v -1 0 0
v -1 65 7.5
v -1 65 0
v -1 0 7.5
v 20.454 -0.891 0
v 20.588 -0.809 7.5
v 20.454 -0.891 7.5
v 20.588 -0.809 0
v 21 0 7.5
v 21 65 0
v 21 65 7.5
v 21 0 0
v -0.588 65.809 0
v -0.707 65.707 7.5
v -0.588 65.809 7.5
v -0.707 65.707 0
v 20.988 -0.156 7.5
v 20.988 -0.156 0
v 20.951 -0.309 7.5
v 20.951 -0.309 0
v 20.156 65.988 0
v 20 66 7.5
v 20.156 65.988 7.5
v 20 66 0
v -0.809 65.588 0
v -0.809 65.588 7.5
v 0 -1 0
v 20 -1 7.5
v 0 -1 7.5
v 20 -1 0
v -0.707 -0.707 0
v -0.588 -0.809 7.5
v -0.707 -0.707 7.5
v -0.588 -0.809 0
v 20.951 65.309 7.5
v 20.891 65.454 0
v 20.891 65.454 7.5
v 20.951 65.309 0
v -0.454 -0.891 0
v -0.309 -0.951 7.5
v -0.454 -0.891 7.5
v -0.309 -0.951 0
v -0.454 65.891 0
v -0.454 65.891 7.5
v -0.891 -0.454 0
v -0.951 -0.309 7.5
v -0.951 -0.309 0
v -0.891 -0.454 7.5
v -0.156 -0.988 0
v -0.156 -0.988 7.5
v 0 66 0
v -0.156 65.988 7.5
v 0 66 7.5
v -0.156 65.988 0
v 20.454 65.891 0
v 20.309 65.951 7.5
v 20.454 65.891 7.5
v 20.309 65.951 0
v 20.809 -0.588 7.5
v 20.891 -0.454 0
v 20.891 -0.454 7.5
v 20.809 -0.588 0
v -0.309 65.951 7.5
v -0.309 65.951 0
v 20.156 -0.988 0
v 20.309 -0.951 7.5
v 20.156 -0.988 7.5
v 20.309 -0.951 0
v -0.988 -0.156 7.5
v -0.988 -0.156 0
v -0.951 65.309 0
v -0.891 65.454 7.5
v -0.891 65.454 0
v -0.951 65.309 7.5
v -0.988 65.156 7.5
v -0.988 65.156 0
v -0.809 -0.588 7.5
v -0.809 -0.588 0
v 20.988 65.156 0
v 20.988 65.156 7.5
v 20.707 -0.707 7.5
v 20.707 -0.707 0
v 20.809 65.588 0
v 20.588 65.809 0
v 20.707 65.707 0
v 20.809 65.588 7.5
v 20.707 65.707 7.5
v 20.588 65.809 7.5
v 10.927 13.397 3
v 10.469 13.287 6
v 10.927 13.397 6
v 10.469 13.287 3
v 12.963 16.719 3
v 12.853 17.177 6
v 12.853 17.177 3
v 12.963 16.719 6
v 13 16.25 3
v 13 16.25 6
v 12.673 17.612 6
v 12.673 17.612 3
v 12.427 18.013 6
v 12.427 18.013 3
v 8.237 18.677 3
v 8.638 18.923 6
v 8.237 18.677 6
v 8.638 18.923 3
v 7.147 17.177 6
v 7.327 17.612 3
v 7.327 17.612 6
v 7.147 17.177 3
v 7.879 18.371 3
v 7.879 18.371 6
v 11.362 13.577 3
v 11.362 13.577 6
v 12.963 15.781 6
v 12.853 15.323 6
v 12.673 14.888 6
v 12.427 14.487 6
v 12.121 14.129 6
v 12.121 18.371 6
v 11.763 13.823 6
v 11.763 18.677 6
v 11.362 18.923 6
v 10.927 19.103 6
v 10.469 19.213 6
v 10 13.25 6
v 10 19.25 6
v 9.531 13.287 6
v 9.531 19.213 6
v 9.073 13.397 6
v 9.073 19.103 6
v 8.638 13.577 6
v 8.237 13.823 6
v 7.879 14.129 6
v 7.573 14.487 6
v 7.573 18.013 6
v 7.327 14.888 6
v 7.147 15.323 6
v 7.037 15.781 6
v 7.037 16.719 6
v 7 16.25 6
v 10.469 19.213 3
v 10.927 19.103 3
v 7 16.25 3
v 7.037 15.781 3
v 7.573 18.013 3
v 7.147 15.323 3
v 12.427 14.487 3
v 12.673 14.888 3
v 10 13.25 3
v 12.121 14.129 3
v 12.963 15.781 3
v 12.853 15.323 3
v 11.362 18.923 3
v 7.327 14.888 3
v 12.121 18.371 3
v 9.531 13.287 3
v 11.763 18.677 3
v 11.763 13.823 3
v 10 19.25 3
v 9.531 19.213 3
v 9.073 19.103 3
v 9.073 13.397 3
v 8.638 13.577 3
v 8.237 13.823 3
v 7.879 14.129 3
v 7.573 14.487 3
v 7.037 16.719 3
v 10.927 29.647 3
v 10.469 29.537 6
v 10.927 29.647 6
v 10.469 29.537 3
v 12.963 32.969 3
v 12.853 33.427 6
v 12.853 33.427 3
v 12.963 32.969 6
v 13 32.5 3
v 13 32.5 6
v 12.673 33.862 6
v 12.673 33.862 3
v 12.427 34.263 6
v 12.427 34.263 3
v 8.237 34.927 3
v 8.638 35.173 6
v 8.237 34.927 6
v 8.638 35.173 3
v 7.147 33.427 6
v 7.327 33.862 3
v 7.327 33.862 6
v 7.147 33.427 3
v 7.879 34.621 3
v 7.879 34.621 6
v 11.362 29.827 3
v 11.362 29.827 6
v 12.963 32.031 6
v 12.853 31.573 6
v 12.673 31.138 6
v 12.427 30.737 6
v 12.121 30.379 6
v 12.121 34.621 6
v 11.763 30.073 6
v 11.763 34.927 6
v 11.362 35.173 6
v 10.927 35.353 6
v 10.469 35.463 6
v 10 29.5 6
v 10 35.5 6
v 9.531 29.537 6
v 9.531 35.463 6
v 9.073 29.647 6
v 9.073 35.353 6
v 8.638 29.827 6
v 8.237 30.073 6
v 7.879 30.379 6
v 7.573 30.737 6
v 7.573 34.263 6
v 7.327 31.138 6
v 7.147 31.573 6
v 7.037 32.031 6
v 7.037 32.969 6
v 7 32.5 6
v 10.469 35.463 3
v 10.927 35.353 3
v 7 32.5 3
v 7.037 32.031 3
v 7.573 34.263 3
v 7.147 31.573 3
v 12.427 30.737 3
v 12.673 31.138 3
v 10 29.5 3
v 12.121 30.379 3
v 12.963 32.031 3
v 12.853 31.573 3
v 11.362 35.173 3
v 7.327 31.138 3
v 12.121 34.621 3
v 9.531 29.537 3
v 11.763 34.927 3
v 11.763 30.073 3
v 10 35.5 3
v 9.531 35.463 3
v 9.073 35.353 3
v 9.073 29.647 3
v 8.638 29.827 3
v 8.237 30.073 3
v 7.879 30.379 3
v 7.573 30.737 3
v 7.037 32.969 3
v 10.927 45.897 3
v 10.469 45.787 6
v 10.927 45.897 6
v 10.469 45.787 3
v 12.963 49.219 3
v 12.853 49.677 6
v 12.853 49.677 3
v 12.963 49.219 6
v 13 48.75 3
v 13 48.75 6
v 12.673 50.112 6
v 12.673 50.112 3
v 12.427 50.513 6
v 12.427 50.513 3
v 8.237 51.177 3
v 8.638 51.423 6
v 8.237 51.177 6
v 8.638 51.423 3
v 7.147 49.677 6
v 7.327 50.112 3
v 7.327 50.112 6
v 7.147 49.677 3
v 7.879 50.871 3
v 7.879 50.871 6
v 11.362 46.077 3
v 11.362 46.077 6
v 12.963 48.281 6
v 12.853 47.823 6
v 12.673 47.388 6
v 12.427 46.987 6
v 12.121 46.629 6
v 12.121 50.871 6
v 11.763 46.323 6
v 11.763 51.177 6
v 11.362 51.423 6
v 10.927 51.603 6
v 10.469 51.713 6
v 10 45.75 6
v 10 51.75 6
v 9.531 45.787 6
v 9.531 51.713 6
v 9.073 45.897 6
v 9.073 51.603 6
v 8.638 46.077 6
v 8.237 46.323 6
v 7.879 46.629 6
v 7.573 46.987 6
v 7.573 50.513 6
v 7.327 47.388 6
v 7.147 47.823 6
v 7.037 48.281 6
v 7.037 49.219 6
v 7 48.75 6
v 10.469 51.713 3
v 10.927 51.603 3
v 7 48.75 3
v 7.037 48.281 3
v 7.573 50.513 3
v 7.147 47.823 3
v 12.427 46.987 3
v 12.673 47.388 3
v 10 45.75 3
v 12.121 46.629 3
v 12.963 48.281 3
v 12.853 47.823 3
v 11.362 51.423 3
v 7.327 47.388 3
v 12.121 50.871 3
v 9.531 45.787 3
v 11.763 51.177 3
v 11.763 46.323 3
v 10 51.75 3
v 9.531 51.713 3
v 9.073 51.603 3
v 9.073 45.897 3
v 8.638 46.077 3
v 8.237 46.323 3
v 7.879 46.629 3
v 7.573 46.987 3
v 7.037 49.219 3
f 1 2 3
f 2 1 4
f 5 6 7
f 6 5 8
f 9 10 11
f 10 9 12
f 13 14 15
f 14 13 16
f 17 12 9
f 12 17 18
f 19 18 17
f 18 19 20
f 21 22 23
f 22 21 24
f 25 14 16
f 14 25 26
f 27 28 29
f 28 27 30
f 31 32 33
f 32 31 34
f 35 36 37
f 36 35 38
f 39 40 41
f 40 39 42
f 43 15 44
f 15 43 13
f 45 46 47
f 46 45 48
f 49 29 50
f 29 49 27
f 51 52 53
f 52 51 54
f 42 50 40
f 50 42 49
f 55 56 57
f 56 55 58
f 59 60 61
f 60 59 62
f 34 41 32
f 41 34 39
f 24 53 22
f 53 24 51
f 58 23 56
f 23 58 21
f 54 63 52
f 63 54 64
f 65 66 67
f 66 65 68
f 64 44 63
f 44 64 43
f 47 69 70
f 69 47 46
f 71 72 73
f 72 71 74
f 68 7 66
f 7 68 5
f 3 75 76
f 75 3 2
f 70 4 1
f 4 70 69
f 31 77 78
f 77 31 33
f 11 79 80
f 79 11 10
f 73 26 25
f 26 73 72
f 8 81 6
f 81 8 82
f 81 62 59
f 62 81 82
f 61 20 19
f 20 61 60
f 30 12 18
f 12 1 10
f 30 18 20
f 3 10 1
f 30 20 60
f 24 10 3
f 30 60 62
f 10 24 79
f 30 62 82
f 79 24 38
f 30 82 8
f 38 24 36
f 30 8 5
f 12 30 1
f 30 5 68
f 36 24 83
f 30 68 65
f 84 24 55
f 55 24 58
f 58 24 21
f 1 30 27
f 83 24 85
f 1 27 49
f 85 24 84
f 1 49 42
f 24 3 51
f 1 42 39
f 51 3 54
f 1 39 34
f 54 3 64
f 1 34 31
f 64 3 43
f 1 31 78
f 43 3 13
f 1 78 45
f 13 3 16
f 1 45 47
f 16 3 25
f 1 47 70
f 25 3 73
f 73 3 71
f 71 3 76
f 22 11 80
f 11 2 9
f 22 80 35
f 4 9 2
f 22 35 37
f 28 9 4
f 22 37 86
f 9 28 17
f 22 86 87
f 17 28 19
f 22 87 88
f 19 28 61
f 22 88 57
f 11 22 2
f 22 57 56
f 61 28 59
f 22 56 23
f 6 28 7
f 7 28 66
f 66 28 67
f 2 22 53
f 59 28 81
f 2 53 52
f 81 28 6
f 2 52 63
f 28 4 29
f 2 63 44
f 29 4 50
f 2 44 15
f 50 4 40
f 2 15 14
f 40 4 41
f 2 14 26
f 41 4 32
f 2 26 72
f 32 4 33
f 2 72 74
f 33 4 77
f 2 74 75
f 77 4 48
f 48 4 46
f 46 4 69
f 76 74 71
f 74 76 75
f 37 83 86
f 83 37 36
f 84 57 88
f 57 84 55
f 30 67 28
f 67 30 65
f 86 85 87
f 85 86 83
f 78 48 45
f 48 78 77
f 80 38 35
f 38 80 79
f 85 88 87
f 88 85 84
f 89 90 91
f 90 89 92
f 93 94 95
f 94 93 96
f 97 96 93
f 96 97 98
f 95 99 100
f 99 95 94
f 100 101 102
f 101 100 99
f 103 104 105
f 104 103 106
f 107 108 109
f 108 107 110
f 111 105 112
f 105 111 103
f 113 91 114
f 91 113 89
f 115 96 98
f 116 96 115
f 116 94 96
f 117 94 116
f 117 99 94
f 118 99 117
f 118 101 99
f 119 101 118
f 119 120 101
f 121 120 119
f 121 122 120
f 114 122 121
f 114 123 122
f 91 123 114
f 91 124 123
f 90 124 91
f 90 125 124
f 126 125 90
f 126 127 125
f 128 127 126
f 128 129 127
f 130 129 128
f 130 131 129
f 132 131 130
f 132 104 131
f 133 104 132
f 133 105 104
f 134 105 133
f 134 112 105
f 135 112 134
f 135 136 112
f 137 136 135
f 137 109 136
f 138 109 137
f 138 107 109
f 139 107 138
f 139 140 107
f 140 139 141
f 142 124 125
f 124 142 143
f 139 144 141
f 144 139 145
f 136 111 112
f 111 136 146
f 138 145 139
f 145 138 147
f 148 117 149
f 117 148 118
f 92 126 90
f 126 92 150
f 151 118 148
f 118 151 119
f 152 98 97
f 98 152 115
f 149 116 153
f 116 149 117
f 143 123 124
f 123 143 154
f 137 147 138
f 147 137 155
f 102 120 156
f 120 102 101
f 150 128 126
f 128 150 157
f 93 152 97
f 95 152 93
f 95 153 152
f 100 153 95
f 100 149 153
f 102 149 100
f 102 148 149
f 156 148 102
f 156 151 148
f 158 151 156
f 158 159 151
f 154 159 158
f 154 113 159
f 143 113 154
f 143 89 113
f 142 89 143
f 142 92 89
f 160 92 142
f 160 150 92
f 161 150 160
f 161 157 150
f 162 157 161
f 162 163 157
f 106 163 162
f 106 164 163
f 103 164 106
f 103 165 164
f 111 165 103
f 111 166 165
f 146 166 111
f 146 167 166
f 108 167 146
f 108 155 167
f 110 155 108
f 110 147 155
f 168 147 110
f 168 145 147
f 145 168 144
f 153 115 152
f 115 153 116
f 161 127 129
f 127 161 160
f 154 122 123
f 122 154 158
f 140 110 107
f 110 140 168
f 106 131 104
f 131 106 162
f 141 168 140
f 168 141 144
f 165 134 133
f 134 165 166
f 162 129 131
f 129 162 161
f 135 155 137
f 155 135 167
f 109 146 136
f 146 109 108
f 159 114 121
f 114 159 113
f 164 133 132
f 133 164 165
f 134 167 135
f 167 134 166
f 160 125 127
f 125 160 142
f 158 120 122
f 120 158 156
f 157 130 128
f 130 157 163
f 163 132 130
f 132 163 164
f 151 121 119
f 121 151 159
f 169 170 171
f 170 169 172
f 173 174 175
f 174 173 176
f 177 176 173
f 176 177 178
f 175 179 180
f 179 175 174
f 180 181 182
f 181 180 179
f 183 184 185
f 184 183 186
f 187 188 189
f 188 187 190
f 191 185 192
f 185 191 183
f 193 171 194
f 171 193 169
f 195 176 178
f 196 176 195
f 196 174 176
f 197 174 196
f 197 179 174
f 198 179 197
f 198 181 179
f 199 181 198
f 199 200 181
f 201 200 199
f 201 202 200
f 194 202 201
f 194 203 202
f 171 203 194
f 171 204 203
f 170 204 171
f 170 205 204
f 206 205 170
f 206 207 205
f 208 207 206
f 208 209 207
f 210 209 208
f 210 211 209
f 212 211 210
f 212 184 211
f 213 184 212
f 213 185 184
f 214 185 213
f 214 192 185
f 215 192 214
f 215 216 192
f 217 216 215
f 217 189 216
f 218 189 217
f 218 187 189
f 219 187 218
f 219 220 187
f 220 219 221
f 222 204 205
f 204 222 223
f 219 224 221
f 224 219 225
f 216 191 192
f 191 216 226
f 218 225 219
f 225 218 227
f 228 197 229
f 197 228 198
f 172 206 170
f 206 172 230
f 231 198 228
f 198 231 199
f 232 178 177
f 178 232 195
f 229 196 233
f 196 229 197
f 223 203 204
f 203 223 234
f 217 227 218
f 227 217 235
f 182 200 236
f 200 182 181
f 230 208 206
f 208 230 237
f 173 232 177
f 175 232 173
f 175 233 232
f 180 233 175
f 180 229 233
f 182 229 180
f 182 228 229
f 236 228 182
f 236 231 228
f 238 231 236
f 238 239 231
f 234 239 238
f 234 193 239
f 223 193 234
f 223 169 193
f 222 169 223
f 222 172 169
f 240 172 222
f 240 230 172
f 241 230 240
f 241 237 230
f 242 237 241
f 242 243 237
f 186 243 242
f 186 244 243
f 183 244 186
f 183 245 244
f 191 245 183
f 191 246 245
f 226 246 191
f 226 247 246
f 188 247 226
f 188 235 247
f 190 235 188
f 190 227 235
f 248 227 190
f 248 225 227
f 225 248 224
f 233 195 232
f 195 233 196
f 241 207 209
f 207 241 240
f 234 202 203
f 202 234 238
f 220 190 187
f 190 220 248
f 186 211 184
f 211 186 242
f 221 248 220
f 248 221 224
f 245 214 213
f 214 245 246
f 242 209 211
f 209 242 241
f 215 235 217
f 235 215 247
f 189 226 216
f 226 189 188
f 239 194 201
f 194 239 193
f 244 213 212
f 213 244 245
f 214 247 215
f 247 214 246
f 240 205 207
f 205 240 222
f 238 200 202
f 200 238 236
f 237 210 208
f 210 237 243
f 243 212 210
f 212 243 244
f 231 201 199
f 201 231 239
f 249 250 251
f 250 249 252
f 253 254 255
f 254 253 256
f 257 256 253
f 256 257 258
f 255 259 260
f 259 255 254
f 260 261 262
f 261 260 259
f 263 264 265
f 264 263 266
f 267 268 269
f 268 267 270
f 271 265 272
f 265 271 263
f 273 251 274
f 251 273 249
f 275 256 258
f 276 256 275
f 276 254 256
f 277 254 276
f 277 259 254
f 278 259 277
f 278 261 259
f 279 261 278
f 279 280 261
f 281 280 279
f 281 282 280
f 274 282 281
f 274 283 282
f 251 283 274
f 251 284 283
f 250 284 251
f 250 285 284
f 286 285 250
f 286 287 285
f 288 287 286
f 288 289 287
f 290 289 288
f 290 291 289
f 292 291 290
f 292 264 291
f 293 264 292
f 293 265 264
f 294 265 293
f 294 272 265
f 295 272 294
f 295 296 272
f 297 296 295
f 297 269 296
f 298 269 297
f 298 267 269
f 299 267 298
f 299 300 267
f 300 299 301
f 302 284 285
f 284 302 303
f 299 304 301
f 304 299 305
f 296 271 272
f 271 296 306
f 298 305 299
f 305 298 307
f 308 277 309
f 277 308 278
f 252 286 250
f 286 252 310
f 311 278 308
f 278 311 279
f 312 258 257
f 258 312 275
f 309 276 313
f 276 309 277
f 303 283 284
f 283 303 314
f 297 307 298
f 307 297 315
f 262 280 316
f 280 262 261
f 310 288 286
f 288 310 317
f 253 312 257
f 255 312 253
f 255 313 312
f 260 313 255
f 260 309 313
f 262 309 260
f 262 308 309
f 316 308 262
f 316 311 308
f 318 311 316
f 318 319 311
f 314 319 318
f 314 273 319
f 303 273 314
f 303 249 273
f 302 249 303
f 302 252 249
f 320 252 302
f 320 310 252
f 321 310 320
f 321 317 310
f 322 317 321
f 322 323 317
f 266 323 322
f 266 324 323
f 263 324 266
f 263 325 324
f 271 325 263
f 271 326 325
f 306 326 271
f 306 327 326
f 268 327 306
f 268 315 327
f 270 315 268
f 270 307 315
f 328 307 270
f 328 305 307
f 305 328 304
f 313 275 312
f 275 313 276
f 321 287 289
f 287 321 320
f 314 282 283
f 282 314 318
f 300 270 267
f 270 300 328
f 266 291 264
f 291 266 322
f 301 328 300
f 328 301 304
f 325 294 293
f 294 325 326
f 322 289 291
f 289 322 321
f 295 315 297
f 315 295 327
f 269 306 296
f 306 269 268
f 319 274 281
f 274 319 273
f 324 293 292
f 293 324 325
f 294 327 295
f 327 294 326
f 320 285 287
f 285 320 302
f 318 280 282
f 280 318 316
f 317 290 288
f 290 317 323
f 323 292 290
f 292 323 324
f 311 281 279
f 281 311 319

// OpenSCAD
$fn = 40;

bredd = 20;
hojd = 65;
djup = 6;

mhojd = 3;
md = 6;

lada();

module lada() {
  difference() {
    minkowski() {
      cube(size=[bredd, hojd, djup]);
      cylinder(h=1.5);
    }

    translate([bredd / 2, hojd / 4, djup / 2])
      cylinder(h=mhojd, d=md);

    translate([bredd / 2, 2 * hojd / 4, djup / 2])
      cylinder(h=mhojd, d=md);

    translate([bredd / 2, 3 * hojd / 4, djup / 2])
      cylinder(h=mhojd, d=md);
  }
}
